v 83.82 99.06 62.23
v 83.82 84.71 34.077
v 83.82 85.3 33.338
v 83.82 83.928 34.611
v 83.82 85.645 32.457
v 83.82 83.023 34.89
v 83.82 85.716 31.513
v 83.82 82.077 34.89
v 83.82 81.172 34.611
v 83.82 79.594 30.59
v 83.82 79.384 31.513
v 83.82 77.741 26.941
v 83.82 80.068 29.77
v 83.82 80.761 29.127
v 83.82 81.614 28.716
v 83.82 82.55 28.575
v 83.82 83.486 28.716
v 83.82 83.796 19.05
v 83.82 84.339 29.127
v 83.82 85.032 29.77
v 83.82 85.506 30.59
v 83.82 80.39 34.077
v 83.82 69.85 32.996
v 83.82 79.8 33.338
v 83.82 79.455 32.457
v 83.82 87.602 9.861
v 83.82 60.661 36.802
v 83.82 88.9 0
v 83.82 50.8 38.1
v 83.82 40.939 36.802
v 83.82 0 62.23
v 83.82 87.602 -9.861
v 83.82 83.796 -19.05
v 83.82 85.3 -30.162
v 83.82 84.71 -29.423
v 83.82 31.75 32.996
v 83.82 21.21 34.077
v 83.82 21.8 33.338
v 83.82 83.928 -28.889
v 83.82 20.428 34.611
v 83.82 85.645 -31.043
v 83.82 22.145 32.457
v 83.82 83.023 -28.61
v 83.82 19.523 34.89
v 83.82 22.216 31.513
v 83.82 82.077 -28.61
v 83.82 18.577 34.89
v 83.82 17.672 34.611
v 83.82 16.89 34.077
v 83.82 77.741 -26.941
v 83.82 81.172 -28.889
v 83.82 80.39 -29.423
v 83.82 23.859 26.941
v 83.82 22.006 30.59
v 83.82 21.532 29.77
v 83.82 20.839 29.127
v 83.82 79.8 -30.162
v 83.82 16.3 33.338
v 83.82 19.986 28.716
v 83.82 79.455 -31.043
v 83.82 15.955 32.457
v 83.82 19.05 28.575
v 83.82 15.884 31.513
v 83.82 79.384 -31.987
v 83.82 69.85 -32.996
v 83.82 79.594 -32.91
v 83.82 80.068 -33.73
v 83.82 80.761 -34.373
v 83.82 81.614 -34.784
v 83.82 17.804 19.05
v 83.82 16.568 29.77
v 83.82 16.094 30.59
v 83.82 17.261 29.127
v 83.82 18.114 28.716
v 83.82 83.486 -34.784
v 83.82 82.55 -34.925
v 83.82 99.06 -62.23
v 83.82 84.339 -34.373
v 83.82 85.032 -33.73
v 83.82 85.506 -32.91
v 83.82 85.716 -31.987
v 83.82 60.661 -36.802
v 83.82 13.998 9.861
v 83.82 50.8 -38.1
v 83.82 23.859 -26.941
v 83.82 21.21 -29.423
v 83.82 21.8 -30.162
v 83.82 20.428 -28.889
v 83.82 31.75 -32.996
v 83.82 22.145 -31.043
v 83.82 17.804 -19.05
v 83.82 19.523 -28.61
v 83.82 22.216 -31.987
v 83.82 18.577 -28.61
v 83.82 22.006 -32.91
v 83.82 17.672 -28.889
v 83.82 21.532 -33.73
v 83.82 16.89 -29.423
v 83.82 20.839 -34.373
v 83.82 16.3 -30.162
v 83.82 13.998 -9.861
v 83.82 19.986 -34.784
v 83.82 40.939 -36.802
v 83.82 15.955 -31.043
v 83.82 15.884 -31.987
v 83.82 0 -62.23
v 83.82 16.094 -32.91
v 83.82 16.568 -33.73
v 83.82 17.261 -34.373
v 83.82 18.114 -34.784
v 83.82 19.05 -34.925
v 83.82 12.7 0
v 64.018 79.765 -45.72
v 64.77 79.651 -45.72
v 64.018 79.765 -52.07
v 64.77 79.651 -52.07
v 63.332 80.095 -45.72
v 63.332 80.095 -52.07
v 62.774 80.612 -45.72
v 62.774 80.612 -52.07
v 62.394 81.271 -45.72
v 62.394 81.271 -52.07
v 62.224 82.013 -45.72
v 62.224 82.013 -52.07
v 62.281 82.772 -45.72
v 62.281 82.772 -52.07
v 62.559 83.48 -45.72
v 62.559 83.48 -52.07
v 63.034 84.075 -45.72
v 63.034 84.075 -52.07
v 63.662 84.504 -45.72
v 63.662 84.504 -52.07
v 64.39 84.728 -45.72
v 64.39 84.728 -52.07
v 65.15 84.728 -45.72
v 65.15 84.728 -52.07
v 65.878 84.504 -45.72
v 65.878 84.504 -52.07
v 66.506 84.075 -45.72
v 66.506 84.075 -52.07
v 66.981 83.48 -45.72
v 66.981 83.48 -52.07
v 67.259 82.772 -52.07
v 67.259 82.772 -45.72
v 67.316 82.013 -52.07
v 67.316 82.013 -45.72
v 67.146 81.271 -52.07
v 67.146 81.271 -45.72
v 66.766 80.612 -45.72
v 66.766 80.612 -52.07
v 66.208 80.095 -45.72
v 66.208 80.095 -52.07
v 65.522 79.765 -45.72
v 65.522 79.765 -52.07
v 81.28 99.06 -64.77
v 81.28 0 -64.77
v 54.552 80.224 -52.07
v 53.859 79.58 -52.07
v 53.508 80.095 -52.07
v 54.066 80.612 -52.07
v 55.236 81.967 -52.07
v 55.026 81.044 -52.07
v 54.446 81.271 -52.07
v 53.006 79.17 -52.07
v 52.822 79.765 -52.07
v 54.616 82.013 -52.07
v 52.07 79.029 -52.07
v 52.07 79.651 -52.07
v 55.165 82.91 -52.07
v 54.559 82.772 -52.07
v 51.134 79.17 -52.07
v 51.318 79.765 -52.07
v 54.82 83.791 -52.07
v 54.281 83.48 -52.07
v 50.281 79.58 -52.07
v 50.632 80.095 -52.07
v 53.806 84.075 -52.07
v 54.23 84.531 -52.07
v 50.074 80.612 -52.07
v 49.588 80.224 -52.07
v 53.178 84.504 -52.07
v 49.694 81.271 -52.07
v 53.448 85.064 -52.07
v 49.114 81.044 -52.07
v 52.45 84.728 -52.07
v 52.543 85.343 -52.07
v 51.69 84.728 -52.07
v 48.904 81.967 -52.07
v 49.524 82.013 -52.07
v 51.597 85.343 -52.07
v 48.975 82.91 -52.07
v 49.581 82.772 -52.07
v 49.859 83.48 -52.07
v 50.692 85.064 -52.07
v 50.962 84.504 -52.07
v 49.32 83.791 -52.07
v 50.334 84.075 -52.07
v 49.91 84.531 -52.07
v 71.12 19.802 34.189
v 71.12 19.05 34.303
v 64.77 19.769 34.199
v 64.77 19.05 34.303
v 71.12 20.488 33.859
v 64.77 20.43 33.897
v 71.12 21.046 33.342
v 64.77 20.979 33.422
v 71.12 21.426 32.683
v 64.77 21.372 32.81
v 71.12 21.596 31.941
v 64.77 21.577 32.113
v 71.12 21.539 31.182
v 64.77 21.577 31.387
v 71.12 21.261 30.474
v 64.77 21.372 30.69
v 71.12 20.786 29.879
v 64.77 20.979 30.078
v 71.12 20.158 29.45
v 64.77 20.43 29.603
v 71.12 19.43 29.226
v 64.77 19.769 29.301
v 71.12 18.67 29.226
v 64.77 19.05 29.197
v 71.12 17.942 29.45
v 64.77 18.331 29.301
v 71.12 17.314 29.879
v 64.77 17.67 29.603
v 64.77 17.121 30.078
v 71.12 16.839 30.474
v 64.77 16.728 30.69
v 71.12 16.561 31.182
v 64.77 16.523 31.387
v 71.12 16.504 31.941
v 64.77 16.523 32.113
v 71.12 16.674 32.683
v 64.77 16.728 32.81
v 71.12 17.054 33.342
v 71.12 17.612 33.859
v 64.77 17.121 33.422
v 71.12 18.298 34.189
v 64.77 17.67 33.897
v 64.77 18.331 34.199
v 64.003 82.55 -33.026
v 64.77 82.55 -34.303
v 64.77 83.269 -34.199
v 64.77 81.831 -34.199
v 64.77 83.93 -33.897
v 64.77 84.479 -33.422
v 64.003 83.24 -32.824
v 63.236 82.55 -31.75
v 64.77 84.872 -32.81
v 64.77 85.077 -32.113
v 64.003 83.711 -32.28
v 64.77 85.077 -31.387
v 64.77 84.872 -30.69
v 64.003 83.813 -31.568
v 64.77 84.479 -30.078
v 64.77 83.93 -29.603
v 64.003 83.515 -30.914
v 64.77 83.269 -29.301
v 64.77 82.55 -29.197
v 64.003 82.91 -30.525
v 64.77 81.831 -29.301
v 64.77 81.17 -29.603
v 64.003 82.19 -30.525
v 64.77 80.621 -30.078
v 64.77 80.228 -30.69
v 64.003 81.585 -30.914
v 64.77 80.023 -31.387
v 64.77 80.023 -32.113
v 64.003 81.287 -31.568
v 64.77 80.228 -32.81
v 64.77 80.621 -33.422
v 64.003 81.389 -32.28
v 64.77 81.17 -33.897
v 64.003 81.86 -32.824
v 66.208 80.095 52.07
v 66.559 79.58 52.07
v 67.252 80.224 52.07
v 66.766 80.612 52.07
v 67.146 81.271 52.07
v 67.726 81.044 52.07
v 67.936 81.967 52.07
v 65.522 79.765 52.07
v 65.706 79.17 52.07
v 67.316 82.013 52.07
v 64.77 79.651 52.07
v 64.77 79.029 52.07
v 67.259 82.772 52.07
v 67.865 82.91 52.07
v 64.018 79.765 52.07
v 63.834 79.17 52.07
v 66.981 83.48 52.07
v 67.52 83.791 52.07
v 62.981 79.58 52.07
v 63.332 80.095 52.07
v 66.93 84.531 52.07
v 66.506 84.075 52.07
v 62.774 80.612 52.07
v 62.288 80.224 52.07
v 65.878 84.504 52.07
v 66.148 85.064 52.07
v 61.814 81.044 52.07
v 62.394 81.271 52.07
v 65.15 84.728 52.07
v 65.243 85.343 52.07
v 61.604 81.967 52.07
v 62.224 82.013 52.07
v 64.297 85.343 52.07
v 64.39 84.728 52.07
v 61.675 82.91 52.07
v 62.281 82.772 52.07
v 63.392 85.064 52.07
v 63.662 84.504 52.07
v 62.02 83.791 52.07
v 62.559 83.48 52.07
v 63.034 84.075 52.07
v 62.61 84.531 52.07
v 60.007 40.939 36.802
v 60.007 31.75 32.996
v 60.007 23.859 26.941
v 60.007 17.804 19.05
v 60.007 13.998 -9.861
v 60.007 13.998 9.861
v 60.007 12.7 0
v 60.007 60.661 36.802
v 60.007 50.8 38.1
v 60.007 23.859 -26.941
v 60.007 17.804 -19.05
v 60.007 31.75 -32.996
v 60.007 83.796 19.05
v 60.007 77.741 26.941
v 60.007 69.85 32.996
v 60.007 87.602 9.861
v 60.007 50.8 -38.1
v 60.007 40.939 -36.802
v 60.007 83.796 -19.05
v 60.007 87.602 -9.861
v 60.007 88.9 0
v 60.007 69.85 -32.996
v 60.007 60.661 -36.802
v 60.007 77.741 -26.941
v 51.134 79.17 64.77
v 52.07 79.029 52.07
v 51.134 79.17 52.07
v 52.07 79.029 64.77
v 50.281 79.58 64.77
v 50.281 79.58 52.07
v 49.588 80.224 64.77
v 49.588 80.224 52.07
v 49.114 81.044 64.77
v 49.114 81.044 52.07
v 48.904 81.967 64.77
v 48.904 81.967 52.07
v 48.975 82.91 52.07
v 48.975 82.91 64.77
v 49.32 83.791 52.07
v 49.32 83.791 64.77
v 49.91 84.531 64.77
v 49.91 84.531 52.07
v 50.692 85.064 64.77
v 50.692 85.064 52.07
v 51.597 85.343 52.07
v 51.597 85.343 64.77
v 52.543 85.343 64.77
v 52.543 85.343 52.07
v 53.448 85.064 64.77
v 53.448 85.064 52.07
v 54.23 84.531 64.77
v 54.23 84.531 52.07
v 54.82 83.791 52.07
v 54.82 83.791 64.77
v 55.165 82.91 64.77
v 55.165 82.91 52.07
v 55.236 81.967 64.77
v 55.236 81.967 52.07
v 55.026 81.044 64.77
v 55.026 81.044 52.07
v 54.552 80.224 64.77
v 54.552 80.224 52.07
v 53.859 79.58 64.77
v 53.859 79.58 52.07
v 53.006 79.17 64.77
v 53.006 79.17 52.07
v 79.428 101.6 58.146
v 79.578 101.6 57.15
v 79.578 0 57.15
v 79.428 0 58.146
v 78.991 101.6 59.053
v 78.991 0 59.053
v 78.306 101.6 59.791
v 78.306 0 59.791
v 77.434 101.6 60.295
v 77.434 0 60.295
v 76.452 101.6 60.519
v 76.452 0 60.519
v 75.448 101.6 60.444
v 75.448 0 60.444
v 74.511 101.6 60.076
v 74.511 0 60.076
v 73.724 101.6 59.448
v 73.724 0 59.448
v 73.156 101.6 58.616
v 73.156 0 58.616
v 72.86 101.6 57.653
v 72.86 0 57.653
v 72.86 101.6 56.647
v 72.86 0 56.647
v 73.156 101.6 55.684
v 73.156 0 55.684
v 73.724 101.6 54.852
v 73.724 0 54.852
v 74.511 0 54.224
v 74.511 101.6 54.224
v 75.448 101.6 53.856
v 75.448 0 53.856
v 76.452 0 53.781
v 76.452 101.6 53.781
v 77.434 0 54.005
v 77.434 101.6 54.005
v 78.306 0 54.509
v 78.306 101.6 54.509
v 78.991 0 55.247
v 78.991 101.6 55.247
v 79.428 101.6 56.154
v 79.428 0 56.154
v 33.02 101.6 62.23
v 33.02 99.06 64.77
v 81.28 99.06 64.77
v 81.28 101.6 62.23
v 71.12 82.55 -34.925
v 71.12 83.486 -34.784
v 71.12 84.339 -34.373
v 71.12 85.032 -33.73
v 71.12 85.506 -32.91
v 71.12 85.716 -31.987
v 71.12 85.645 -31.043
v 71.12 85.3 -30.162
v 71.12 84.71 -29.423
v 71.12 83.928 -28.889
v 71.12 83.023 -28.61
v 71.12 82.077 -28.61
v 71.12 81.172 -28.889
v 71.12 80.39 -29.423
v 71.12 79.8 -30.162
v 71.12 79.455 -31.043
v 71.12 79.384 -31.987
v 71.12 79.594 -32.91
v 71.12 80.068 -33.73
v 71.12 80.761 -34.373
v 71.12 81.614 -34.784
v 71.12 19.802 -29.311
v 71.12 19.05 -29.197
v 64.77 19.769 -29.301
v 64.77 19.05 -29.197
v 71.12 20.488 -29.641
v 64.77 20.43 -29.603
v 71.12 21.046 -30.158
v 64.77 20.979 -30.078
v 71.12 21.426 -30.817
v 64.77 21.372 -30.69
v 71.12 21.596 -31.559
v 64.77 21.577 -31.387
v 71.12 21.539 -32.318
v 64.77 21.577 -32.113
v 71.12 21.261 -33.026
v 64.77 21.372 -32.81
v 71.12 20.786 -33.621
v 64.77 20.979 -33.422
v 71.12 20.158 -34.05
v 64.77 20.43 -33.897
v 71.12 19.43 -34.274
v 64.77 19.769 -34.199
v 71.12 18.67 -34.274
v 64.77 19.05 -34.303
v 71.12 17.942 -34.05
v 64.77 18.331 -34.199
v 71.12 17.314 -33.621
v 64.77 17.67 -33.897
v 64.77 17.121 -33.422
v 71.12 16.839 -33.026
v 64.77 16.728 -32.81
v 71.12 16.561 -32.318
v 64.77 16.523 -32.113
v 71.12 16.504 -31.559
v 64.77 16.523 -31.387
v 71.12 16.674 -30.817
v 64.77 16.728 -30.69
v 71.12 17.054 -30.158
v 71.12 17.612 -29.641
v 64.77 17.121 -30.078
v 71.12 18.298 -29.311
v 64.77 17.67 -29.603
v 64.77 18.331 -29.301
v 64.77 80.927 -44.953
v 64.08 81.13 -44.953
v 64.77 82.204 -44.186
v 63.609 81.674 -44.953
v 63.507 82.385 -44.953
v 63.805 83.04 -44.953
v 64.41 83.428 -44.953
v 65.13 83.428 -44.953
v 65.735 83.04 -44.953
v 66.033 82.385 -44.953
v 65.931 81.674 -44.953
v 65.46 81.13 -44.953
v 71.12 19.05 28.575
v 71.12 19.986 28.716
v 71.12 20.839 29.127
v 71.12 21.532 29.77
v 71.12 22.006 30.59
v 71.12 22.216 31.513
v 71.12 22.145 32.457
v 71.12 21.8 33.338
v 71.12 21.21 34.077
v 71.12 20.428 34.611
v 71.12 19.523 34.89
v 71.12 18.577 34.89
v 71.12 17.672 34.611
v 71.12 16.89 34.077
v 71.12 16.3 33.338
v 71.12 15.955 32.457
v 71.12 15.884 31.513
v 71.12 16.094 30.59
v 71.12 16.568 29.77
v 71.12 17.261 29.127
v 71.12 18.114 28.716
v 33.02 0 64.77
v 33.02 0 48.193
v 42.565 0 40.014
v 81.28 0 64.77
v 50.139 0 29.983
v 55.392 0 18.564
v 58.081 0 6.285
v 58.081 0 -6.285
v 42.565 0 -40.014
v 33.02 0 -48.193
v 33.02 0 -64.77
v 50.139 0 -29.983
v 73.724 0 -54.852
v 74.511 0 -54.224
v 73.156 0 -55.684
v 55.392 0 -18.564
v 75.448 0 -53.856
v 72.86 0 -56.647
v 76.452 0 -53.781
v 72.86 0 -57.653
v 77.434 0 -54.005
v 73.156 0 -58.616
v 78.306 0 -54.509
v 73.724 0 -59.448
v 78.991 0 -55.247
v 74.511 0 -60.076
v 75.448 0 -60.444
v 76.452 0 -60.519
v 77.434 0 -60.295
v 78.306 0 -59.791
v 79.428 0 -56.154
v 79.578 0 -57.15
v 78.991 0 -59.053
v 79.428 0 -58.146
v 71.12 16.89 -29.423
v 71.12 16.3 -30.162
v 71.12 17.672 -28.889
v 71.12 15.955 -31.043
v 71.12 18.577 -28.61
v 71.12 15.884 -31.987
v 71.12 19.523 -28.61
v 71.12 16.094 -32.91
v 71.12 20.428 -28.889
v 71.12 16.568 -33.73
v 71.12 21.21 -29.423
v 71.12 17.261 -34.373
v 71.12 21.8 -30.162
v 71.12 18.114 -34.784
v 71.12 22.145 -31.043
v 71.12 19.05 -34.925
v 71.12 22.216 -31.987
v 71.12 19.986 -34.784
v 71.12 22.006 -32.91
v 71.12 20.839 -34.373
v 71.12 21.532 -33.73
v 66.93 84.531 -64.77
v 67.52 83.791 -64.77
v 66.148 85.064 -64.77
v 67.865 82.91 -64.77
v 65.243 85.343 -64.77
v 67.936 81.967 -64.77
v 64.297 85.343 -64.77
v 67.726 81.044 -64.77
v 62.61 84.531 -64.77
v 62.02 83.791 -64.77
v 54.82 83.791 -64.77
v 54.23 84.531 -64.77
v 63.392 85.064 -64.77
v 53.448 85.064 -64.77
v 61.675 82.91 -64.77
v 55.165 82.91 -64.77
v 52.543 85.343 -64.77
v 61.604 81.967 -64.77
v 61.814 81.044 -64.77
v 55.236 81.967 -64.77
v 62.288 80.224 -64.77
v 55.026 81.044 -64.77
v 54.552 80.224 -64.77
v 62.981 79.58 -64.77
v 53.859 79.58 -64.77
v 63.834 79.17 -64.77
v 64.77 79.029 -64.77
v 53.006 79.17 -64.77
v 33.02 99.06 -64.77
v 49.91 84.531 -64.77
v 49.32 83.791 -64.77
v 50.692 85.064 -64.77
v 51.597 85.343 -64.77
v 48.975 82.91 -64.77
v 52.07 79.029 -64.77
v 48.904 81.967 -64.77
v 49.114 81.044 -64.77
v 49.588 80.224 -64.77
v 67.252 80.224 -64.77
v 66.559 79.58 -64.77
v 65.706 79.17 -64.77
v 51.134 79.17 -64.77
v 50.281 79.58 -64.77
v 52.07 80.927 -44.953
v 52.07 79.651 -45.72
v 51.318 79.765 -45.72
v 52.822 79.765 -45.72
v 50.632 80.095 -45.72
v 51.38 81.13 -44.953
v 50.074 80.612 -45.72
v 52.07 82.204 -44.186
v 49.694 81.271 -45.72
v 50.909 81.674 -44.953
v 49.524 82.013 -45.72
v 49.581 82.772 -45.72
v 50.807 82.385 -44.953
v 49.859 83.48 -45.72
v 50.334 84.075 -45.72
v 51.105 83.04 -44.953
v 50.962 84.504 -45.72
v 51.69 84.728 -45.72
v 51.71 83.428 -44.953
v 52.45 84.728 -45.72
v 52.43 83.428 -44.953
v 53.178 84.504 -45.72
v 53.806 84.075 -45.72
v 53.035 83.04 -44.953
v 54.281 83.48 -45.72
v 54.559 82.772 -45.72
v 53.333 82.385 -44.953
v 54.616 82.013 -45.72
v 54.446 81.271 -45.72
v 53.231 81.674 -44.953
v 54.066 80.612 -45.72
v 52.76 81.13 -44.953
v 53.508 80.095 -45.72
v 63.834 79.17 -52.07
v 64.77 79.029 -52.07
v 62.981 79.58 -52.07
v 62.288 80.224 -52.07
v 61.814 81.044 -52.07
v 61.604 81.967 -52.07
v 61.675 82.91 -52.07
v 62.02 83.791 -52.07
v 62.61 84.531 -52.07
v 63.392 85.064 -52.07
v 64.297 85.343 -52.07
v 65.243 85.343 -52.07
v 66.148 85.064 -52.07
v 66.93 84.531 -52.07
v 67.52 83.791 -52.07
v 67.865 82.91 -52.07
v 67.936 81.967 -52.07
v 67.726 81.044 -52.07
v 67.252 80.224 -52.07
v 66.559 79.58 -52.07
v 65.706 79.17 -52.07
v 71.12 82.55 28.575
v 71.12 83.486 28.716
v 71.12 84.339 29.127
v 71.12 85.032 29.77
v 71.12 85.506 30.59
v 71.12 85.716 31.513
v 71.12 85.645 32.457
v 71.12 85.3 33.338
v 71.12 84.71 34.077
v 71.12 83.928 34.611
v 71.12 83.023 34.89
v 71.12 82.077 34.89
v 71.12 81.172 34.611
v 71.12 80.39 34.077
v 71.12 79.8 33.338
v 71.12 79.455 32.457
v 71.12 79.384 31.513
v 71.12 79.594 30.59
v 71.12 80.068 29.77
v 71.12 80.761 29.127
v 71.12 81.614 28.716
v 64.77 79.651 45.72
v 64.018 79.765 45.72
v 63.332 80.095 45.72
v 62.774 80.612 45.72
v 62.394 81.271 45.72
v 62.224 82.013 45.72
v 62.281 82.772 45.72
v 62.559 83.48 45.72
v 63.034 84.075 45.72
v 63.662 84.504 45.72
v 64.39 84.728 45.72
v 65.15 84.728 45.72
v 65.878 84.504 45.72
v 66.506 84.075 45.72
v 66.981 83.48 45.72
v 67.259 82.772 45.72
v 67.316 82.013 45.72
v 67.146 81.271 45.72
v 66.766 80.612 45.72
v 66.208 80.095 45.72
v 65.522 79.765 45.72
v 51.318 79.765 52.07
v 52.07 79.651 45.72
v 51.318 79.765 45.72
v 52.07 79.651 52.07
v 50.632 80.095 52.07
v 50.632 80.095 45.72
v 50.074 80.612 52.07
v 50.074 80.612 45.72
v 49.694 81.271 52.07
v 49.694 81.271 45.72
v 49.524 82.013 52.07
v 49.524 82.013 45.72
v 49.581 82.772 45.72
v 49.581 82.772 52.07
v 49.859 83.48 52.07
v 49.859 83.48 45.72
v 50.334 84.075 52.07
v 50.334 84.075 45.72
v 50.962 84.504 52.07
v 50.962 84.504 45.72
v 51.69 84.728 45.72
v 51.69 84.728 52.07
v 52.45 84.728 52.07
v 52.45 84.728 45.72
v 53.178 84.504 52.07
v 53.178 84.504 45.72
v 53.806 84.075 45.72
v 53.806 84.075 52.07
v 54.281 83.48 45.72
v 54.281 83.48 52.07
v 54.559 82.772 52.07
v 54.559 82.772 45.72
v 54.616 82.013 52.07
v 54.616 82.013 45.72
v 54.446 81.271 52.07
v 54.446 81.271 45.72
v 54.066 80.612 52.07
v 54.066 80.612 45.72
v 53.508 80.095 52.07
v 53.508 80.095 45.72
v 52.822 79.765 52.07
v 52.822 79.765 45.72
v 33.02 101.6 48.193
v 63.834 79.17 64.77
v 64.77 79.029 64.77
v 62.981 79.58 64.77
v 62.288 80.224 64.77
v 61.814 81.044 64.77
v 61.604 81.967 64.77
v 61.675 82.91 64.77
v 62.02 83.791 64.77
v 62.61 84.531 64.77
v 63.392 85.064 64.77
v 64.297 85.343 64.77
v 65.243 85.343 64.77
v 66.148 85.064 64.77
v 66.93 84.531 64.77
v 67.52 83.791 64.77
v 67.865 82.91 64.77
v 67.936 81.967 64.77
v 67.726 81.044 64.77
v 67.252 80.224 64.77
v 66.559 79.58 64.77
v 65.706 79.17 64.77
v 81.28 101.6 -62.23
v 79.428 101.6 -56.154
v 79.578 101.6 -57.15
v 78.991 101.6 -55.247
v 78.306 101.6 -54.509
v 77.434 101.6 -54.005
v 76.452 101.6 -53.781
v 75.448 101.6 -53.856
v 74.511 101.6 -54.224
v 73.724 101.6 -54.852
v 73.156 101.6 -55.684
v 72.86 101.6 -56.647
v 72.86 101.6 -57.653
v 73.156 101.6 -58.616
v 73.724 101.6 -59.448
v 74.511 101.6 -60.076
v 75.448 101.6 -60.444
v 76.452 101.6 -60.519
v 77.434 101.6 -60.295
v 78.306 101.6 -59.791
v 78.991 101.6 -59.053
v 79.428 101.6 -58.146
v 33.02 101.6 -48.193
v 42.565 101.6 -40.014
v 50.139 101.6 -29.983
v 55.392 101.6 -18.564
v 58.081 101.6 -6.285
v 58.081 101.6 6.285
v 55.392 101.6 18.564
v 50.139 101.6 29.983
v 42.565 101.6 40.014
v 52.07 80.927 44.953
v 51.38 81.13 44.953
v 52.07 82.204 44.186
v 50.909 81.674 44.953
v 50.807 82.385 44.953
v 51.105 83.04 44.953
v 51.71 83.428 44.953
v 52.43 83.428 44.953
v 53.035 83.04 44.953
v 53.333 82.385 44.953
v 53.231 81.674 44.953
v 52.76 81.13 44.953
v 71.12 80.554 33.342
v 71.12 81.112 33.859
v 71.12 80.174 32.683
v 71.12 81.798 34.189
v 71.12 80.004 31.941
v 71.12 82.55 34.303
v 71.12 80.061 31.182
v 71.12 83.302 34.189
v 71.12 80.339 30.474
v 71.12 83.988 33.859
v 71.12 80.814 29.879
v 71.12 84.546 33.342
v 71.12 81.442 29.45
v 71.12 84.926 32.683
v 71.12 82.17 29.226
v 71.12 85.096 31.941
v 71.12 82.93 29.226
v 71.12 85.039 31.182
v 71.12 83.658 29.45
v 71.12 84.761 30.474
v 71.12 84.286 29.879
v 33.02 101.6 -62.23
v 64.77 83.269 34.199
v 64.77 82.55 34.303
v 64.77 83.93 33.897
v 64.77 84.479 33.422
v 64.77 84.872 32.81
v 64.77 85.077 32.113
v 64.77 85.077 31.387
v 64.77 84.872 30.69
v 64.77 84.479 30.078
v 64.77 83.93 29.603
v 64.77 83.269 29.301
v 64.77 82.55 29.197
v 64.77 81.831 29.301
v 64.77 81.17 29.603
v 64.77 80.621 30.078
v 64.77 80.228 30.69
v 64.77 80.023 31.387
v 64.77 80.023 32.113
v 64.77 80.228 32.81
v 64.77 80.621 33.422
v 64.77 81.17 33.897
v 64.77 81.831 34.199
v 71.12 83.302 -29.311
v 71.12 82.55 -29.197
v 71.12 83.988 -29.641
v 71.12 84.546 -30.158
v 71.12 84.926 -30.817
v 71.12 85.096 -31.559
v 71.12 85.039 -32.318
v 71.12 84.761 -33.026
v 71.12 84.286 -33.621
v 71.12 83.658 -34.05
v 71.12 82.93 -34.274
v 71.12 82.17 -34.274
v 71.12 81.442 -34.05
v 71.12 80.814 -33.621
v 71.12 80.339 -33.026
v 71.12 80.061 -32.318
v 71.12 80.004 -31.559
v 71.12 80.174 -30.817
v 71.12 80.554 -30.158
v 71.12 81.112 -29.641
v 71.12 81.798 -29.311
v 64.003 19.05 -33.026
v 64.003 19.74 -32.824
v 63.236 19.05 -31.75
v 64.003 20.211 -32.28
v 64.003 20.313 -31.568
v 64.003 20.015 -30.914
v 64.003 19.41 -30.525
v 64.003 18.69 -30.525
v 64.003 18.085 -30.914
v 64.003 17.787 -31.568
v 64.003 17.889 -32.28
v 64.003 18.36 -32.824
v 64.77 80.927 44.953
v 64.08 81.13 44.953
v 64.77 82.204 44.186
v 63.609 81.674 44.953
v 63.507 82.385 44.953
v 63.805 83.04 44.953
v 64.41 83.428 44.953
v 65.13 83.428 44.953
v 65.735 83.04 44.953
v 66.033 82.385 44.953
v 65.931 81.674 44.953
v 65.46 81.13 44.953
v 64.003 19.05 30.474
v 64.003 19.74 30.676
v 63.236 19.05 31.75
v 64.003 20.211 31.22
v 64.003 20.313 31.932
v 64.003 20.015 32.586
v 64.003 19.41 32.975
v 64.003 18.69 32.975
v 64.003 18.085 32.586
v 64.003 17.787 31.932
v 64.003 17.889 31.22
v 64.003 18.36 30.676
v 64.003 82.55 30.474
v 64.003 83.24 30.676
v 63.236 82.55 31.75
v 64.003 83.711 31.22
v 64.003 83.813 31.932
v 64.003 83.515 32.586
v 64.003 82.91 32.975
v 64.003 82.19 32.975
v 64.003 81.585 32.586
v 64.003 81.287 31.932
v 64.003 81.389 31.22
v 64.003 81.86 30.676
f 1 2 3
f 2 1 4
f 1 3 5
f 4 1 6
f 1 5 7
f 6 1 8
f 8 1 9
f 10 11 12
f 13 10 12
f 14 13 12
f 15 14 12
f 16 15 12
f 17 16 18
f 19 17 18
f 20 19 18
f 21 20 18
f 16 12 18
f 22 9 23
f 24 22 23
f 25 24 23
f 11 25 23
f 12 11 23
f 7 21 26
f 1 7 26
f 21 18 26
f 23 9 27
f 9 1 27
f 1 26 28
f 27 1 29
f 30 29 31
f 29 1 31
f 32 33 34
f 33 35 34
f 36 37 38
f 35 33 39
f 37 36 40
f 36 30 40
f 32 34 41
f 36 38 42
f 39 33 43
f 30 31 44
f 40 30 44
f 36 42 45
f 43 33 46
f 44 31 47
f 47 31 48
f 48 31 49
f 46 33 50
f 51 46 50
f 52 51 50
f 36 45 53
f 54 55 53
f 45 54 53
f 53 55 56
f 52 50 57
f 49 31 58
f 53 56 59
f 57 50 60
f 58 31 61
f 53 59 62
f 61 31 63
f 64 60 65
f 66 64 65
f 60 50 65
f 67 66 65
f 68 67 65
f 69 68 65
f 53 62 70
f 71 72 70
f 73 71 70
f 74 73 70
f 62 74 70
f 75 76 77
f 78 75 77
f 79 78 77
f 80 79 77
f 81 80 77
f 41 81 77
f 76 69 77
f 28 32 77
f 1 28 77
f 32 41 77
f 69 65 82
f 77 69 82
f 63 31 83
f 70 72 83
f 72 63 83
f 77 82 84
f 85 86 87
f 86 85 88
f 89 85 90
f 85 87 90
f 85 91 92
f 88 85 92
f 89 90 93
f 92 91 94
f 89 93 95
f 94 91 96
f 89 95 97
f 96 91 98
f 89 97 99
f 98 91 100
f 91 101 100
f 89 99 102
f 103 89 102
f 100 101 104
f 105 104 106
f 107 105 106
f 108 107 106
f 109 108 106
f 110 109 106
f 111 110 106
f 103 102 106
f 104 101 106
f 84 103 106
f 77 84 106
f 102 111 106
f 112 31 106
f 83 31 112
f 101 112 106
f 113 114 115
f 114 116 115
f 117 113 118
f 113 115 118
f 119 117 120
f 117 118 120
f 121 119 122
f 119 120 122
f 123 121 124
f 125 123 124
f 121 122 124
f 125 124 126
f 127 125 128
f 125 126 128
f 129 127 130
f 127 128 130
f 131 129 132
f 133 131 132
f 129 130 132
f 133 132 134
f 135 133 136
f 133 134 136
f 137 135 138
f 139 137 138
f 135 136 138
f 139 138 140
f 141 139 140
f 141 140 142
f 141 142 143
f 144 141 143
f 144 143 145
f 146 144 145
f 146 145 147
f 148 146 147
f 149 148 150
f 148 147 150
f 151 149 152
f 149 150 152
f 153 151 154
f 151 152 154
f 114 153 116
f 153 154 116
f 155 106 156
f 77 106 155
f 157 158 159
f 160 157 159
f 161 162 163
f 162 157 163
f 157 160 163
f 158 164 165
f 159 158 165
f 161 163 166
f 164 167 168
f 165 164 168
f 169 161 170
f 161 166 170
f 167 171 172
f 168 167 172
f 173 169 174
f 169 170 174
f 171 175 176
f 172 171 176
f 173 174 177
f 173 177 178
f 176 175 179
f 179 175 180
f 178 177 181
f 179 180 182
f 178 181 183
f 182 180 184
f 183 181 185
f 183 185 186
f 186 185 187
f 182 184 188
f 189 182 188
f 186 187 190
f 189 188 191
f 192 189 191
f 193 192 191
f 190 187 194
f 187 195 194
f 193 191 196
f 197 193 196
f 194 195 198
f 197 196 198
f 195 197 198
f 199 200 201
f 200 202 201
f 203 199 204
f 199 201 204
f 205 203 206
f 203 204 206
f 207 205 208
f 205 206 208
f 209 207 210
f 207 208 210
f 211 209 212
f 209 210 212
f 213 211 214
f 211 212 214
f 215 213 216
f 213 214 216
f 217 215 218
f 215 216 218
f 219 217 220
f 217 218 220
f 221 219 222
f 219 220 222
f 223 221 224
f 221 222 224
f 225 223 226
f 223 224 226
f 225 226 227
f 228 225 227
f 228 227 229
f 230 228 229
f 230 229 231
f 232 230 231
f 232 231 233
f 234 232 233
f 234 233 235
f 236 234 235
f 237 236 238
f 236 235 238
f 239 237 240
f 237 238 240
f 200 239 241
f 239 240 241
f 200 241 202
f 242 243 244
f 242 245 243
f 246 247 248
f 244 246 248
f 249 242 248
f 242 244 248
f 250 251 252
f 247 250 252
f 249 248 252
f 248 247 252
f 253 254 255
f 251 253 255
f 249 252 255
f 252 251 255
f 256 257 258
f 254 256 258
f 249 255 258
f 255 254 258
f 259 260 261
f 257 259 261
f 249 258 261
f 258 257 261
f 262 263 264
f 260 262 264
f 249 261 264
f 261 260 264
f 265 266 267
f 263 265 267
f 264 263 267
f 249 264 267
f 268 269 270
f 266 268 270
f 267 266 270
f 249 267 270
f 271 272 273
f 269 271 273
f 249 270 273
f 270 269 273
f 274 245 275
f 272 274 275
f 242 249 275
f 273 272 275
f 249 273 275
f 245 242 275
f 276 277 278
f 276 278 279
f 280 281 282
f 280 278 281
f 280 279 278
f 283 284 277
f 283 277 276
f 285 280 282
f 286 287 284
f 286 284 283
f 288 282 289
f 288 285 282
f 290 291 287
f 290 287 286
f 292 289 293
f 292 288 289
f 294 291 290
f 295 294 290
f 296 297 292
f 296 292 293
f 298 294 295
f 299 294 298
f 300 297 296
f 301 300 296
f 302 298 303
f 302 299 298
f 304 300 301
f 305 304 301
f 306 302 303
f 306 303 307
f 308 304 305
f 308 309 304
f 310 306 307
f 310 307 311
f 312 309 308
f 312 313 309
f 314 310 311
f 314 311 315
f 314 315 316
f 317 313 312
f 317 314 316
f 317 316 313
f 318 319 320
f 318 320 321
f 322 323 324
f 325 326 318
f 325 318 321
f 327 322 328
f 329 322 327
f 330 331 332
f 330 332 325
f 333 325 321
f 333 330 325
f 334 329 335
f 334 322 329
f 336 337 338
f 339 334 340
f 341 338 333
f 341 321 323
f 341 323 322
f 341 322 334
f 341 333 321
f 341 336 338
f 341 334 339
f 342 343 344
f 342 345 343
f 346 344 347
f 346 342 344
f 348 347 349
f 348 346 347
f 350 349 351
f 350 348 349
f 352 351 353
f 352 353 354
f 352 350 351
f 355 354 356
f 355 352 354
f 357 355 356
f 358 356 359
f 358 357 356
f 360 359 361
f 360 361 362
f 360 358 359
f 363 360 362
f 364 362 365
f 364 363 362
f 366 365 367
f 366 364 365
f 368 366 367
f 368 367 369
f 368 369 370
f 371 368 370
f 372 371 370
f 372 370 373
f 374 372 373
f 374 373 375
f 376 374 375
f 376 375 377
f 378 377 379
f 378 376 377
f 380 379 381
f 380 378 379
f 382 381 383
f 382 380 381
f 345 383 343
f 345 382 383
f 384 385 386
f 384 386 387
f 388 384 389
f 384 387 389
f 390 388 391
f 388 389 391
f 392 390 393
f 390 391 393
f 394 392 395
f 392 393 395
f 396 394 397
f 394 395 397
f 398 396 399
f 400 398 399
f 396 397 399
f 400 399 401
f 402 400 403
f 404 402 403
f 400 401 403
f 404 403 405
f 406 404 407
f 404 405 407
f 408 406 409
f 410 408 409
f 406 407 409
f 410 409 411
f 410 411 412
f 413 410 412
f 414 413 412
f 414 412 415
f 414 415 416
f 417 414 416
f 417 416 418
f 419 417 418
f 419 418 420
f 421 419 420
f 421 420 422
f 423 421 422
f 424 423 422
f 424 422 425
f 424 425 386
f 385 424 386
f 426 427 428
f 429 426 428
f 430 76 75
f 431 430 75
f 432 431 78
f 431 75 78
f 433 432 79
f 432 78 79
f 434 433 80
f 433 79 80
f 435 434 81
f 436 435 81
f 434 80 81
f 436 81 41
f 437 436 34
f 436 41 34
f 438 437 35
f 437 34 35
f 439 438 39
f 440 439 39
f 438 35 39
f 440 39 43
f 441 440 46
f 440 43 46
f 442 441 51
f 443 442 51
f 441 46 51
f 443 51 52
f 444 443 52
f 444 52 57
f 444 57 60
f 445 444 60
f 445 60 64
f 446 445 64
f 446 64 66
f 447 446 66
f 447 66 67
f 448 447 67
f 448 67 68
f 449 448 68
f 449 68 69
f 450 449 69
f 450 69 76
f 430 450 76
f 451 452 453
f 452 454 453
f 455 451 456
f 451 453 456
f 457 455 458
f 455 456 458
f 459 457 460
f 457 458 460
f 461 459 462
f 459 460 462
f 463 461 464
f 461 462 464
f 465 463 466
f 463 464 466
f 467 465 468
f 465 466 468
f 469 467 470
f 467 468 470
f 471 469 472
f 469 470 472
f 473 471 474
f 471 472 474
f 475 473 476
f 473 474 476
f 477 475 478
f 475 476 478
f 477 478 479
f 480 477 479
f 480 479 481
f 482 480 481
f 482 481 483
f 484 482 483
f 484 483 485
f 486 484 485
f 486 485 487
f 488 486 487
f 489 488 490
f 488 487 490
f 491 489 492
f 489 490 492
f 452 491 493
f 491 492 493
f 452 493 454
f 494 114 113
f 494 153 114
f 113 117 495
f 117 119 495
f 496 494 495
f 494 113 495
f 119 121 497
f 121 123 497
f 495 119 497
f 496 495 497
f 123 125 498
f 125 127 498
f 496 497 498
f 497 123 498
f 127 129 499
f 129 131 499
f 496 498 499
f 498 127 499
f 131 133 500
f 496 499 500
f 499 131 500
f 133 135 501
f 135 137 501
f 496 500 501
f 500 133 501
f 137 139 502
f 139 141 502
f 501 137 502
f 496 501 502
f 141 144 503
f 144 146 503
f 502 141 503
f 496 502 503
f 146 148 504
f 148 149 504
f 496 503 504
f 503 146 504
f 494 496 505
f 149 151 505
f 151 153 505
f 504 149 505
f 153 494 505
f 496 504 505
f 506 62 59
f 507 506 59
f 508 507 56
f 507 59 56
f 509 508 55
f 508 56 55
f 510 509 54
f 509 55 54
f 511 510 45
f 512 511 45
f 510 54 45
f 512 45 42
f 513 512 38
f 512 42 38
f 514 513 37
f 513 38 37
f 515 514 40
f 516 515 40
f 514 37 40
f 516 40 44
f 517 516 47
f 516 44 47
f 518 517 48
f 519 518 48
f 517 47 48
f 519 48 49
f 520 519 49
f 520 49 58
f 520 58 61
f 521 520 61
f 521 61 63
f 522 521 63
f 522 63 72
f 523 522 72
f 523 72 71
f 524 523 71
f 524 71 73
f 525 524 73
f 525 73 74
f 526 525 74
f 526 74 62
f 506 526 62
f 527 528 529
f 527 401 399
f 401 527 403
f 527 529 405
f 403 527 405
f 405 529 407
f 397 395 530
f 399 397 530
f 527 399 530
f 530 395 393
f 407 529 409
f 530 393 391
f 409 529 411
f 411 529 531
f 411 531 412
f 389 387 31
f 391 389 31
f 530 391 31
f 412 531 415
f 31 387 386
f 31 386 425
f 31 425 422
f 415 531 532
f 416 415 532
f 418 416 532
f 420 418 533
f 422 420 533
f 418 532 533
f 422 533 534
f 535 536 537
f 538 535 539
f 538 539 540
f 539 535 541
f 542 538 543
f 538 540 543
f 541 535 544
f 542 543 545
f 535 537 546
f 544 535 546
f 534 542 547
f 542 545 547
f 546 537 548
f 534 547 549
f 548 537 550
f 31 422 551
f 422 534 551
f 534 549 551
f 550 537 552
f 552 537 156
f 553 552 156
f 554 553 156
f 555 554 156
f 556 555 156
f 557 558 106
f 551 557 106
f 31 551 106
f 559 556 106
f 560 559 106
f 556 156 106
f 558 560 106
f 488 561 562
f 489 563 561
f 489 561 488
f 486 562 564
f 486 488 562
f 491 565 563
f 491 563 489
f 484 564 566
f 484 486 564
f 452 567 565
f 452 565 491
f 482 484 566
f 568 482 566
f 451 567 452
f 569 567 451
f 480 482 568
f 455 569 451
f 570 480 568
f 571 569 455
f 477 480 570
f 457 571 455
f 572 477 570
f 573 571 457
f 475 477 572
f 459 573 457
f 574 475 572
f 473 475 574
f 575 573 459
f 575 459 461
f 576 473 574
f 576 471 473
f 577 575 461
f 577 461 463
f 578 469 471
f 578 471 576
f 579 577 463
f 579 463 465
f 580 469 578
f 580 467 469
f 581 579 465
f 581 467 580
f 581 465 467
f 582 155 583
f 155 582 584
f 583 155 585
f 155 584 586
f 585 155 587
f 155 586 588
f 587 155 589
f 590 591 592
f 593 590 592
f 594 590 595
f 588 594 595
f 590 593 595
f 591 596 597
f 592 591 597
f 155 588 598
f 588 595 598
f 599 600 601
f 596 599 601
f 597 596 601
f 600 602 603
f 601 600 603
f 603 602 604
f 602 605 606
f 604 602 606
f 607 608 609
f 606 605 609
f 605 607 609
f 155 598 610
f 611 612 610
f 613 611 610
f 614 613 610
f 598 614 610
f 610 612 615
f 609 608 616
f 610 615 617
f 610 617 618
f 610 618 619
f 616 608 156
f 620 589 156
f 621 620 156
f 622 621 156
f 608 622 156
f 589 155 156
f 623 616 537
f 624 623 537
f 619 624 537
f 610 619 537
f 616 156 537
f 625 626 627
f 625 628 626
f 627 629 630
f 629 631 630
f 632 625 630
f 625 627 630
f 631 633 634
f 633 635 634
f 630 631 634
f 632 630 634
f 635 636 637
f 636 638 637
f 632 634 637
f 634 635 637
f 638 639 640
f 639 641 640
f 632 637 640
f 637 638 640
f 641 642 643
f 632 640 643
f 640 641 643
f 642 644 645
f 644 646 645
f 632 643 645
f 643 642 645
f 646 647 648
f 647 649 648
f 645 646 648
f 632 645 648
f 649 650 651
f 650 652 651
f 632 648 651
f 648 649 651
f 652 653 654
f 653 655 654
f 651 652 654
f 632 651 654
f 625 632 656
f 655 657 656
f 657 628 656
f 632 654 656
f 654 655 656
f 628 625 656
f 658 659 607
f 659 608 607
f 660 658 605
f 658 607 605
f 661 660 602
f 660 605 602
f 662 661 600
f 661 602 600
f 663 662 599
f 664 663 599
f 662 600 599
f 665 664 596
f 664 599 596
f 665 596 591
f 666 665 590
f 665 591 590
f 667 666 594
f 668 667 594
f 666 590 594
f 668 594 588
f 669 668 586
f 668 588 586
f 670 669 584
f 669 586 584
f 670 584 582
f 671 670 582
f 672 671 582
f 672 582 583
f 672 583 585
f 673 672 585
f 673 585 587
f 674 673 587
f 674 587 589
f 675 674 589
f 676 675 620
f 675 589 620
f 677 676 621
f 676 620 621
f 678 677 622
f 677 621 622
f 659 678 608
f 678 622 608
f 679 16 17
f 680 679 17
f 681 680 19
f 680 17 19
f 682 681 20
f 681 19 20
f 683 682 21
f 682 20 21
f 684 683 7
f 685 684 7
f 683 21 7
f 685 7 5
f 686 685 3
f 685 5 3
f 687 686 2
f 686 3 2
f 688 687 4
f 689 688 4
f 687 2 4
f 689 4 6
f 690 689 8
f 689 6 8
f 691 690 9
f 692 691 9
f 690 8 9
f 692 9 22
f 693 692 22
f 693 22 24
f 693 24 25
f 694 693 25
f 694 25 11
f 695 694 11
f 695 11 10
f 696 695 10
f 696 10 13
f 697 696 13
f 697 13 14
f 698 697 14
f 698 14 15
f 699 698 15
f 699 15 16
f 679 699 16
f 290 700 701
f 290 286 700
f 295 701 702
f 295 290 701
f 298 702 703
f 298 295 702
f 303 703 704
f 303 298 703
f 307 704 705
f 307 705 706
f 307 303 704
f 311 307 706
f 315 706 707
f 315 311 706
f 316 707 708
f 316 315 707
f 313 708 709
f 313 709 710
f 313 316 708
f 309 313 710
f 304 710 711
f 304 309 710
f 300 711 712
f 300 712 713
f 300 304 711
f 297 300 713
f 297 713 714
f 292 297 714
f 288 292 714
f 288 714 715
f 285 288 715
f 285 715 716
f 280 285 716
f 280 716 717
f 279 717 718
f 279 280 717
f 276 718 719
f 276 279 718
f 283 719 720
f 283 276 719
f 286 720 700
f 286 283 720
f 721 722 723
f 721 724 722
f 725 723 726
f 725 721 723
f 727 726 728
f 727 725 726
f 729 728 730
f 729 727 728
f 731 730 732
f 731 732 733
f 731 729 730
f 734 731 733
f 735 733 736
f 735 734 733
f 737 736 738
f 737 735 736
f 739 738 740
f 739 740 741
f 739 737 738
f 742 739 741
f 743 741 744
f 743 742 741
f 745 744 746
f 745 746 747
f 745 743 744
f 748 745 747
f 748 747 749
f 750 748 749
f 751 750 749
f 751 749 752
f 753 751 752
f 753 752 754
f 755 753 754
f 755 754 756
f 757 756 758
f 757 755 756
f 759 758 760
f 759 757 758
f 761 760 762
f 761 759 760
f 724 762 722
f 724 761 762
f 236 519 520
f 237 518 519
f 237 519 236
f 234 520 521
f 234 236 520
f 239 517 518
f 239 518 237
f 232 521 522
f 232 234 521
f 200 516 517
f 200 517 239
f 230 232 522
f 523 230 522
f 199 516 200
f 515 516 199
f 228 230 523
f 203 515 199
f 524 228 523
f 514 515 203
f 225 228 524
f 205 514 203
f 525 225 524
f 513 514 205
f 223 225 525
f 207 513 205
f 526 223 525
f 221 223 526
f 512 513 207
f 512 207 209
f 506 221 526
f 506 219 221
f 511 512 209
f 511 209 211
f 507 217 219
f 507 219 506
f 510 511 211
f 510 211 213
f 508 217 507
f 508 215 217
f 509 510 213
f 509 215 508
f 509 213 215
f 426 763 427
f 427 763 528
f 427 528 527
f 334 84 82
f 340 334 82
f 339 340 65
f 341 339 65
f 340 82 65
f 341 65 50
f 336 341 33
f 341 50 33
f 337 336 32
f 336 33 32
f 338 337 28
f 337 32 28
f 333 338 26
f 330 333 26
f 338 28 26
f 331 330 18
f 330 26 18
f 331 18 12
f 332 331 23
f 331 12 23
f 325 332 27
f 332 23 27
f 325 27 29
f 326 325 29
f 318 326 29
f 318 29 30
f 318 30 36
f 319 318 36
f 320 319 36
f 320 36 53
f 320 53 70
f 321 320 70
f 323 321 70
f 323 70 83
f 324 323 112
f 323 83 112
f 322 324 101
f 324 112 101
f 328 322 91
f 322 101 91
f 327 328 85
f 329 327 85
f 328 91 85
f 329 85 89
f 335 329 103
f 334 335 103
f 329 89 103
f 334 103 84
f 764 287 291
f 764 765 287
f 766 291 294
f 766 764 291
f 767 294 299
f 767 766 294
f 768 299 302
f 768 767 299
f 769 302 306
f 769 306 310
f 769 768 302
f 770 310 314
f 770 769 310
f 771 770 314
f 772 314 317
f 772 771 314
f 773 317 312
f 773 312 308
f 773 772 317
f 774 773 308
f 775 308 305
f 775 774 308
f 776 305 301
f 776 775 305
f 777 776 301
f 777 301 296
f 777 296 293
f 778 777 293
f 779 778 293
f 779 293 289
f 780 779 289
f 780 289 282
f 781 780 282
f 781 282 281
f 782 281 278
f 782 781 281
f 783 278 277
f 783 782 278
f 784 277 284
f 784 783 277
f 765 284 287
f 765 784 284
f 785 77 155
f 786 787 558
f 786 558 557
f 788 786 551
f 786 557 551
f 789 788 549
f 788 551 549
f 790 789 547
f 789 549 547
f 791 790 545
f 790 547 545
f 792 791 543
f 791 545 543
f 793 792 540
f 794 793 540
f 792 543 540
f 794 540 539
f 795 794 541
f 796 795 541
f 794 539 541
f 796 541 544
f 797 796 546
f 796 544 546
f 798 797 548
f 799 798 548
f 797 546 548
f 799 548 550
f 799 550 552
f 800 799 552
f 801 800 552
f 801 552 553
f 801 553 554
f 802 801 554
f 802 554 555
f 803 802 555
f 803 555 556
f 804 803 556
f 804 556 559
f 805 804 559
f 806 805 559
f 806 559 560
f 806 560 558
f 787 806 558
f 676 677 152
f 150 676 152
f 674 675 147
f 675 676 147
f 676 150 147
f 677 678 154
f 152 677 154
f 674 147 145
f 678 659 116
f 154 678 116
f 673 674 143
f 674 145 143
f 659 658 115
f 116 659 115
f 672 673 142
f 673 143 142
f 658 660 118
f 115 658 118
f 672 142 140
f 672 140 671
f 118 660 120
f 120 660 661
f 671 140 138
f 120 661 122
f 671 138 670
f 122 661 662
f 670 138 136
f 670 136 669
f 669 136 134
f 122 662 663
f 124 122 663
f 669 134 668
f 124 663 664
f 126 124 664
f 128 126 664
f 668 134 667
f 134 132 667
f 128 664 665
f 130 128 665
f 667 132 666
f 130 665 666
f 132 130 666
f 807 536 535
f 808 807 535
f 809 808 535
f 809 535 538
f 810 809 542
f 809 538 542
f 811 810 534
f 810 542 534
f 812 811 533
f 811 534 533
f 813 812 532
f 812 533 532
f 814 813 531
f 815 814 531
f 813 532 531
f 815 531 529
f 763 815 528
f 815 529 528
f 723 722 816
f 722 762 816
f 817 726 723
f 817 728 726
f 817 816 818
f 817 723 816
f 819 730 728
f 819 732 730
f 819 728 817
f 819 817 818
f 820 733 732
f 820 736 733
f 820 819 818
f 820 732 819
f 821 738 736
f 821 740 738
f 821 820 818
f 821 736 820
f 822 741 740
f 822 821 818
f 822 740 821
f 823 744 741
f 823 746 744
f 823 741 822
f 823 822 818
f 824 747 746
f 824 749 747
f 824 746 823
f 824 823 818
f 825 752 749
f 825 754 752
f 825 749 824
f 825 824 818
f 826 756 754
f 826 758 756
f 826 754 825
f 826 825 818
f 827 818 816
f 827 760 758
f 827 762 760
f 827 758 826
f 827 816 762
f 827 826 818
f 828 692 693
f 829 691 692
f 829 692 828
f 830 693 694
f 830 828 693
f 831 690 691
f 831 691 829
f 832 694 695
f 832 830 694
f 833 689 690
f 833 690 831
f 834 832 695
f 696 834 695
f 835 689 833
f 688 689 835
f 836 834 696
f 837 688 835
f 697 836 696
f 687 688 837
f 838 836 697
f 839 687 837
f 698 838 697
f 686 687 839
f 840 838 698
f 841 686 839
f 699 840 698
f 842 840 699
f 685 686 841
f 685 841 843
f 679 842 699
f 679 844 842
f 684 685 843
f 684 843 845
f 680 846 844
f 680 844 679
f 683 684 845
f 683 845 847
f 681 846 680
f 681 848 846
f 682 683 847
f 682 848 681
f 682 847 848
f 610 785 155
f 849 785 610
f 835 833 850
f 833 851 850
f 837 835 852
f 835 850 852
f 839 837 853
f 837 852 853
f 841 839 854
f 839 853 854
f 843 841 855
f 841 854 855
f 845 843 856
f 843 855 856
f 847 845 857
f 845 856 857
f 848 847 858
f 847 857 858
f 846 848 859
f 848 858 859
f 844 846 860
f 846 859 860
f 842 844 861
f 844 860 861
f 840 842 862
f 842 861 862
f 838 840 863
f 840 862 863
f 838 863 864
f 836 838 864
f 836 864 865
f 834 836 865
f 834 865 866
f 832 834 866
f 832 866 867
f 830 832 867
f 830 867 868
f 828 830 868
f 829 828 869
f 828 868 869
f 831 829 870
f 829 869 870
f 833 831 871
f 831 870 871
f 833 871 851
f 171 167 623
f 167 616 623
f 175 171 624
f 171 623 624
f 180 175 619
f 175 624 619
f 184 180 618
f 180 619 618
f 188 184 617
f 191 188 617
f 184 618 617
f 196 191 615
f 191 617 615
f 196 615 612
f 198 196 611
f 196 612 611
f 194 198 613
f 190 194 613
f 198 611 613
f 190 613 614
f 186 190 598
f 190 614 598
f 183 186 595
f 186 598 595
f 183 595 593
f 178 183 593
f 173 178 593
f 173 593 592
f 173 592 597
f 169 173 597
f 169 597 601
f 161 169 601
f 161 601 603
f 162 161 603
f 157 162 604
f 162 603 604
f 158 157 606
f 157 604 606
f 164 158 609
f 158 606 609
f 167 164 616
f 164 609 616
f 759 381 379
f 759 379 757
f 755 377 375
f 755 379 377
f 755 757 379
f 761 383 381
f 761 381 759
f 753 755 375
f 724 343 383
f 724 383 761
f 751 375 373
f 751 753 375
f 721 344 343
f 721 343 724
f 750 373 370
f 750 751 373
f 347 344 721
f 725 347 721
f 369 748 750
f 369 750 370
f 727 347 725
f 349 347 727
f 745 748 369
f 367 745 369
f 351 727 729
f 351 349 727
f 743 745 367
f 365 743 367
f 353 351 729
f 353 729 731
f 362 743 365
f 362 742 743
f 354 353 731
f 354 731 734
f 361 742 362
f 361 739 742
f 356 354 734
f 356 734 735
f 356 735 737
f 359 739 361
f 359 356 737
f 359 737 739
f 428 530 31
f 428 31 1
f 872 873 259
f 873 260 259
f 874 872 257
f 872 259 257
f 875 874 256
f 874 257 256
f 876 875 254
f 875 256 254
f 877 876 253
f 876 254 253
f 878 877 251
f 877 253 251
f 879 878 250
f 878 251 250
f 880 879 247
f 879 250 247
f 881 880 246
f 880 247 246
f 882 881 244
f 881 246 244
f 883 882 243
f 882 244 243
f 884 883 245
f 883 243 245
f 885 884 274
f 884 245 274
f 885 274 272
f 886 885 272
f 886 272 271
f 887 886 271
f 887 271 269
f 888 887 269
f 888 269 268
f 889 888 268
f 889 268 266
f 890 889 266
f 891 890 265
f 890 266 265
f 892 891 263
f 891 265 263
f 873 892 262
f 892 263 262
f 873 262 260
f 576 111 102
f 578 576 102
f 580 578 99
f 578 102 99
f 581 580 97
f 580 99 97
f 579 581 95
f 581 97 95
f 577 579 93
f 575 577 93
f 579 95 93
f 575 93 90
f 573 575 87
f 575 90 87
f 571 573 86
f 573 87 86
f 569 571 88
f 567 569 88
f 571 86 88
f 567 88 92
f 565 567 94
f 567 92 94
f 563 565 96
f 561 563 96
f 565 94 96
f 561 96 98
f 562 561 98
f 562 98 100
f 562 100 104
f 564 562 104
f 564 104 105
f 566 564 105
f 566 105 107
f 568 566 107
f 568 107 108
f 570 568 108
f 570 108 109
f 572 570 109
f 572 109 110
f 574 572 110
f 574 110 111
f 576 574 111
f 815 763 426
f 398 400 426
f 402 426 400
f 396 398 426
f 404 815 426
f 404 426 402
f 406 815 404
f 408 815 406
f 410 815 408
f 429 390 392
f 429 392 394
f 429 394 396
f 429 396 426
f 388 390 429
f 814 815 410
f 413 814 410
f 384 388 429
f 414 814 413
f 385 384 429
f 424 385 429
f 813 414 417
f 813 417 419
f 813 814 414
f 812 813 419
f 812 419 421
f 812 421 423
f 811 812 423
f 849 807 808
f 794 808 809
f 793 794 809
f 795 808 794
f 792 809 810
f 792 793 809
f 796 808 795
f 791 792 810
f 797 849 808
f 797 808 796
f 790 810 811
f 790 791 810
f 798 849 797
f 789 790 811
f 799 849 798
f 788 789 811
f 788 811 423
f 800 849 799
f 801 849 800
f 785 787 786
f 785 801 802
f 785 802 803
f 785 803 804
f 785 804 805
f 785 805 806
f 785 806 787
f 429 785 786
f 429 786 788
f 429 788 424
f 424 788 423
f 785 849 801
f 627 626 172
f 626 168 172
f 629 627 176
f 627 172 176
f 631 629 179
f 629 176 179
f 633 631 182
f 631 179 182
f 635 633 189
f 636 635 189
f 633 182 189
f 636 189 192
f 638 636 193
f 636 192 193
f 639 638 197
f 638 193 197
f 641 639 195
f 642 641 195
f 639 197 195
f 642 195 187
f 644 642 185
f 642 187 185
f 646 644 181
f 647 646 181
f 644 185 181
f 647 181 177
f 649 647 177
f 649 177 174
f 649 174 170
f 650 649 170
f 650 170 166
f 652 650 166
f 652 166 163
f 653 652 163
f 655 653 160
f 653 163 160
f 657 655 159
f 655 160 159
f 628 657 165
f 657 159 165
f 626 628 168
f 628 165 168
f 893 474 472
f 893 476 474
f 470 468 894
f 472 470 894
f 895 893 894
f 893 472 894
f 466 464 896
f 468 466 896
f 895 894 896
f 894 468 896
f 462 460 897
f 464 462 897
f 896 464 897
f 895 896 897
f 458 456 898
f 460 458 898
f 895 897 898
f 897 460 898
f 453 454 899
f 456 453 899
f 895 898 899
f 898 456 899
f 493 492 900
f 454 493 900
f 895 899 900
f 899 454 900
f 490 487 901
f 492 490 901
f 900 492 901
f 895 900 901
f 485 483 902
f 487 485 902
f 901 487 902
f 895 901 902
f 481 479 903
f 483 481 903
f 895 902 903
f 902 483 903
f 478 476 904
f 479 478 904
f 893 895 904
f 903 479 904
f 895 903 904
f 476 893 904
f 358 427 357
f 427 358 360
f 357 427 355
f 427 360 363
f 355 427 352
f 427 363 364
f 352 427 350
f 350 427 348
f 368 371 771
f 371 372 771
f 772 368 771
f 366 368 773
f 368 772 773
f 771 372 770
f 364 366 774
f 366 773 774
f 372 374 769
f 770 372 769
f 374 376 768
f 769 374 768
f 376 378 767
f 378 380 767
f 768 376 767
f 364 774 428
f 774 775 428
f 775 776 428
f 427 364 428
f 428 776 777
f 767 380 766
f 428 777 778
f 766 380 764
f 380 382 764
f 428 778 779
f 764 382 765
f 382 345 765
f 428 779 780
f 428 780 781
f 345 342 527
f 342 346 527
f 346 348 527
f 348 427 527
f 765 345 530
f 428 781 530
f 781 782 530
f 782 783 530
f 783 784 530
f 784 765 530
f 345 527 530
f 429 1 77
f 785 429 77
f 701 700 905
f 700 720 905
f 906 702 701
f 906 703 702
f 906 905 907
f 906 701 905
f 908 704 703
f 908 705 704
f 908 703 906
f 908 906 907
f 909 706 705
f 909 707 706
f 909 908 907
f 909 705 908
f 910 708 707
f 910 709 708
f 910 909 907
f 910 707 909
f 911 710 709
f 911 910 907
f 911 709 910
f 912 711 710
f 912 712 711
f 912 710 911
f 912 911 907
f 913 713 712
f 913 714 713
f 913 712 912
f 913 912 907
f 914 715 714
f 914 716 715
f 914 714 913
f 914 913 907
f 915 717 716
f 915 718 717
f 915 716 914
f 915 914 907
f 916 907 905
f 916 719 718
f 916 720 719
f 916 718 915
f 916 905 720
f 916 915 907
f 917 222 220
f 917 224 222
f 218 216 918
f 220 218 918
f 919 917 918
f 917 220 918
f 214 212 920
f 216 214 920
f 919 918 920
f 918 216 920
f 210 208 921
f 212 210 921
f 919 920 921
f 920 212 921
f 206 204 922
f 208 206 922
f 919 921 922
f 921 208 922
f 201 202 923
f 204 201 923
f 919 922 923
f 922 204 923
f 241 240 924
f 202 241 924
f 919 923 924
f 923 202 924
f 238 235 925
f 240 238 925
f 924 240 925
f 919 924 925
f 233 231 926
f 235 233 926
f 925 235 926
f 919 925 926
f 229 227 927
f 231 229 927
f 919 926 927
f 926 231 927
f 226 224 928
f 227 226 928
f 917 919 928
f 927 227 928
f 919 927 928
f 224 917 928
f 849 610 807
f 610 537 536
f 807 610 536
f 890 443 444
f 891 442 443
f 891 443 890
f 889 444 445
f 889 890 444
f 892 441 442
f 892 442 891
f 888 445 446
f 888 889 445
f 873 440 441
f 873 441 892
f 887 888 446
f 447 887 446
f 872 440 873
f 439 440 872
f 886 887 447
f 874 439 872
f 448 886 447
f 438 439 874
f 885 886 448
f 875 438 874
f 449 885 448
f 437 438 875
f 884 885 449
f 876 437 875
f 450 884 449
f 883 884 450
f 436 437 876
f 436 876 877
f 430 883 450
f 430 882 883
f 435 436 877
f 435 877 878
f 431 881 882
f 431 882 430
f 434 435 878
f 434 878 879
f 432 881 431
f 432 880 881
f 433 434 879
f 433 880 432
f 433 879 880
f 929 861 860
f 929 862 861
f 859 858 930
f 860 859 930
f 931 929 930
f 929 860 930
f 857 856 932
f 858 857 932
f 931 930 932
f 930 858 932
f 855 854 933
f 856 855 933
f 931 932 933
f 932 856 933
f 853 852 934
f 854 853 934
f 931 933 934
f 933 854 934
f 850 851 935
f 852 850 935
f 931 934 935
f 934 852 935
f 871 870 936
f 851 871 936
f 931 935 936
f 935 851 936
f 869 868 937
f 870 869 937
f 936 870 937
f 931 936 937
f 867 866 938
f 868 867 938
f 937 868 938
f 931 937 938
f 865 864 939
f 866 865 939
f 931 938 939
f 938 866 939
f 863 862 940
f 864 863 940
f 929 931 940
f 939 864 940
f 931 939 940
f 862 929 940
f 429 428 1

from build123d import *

# Parameters (mm, degrees)
BOSS_EXTRUDE1_DEPTH               = 101.6
SKETCH2_R                         = 38.1
CUT_EXTRUDE2_DEPTH                = 23.8125
F_1_4_20_TAPPED_HOLE1_D           = 5.1054
F_1_4_20_TAPPED_HOLE1_DEPTH       = 19.05
F_1_4_20_TAPPED_HOLE1_CBORE_D     = 6.35
F_1_4_20_TAPPED_HOLE1_CBORE_DEPTH = 12.7
F_1_4_20_TAPPED_HOLE1_TIP         = 1.533816902
H_0_266_DIAMETER_HOLE1_D          = 6.7564
F_1_4_20_TAPPED_HOLE2_AT_2_COUNT  = 2
F_1_4_20_TAPPED_HOLE2_AT_2_PITCH  = 12.7
CHAMFER1_SIZE                     = 2.54


with BuildPart() as part:
    # Sketch1 → Boss-Extrude1 (new body)
    with BuildSketch(Plane(origin=(0, 0, 0), x_dir=(1, 0, 0), z_dir=(0, 1, 0))):
        with BuildLine():
            Line((33.02, 64.77), (33.02, 48.193111541))
            ThreePointArc((33.02, 48.193111541), (58.42, 0), (33.02, -48.193111541))
            Line((33.02, -48.193111541), (33.02, -64.77))
            Line((33.02, -64.77), (83.82, -64.77))
            Line((83.82, -64.77), (83.82, 64.77))
            Line((83.82, 64.77), (33.02, 64.77))
        make_face()
    extrude(amount=BOSS_EXTRUDE1_DEPTH)

    # Sketch2 → Cut-Extrude2 (cut)
    with BuildSketch(Plane(origin=(83.82, 0, 0), x_dir=(0, 0, -1), z_dir=(1, 0, 0))):
        with Locations((0, 50.8)):
            Circle(SKETCH2_R)
    extrude(amount=-CUT_EXTRUDE2_DEPTH, mode=Mode.SUBTRACT)

    # 1/4-20 Tapped Hole1
    with Locations(Plane(origin=(83.82, 0, 0), x_dir=(0, 0, -1), z_dir=(1, 0, 0))):
        with Locations((-31.75, 82.55), (31.75, 82.55), (31.75, 19.05), (-31.75, 19.05)):
            CounterBoreHole(F_1_4_20_TAPPED_HOLE1_D / 2, F_1_4_20_TAPPED_HOLE1_CBORE_D / 2, F_1_4_20_TAPPED_HOLE1_CBORE_DEPTH, depth=F_1_4_20_TAPPED_HOLE1_DEPTH)
            with Locations((0, 0, -(F_1_4_20_TAPPED_HOLE1_DEPTH + F_1_4_20_TAPPED_HOLE1_TIP / 2))):  # 118° drill point
                Cone(0, F_1_4_20_TAPPED_HOLE1_D / 2, F_1_4_20_TAPPED_HOLE1_TIP, mode=Mode.SUBTRACT)

    # H (0.266) Diameter Hole1 (through all)
    with Locations(Plane(origin=(0, 101.6, 0), x_dir=(-1, 0, 0), z_dir=(0, 1, 0))):
        with Locations((76.2, -57.15), (76.2, 57.15), (-76.2, 57.15), (-76.2, -57.15)):
            Hole(H_0_266_DIAMETER_HOLE1_D / 2)

    # Sketch11 → 1/4-20 Tapped Hole2 (revolve, cut)
    with BuildSketch(Plane(origin=(64.77, 82.20380383, 64.77), x_dir=(0, -1, 0), z_dir=(1, 0, 0))):
        Polygon((0, 0), (0, 20.583816902), (2.5527, 19.05), (2.5527, 12.7), (3.175, 12.7), (3.175, 0), align=None)
    f_1_4_20_tapped_hole2 = revolve(axis=Axis((64.77, 82.20380383, 71.12), (0, 0, -1)), mode=Mode.SUBTRACT)

    # 1/4-20 Tapped Hole2 at 2: 1/4-20 Tapped Hole2 ×2
    with Locations(*[(-i * F_1_4_20_TAPPED_HOLE2_AT_2_PITCH, 0, 0) for i in range(1, F_1_4_20_TAPPED_HOLE2_AT_2_COUNT)]):
        add(f_1_4_20_tapped_hole2, mode=Mode.SUBTRACT)

    # Mirror1: 1/4-20 Tapped Hole2 across plane
    add(f_1_4_20_tapped_hole2.mirror(Plane.XY), mode=Mode.SUBTRACT)

    # Mirror1 copy 1 sketch → Mirror1 copy 1 (revolve, cut)
    with BuildSketch(Plane(origin=(52.07, 82.20380383, -64.77), x_dir=(0, -1, 0), z_dir=(1, 0, 0))):
        Polygon((0, 0), (0, -20.583816902), (2.5527, -19.05), (2.5527, -12.7), (3.175, -12.7), (3.175, 0), align=None)
    revolve(axis=Axis((52.07, 82.20380383, -71.12), (0, 0, -1)), mode=Mode.SUBTRACT)

    # Chamfer1
    chamfer1_edges = [part.edges().sort_by_distance(p)[0] for p in [
        (83.82, 50.8, 64.77),
        (83.82, 50.8, -64.77),
        (58.42, 101.6, 64.77),
        (83.82, 101.6, 0),
        (58.42, 101.6, -64.77),
    ]]
    chamfer(chamfer1_edges, length=CHAMFER1_SIZE)


solid = part.part
